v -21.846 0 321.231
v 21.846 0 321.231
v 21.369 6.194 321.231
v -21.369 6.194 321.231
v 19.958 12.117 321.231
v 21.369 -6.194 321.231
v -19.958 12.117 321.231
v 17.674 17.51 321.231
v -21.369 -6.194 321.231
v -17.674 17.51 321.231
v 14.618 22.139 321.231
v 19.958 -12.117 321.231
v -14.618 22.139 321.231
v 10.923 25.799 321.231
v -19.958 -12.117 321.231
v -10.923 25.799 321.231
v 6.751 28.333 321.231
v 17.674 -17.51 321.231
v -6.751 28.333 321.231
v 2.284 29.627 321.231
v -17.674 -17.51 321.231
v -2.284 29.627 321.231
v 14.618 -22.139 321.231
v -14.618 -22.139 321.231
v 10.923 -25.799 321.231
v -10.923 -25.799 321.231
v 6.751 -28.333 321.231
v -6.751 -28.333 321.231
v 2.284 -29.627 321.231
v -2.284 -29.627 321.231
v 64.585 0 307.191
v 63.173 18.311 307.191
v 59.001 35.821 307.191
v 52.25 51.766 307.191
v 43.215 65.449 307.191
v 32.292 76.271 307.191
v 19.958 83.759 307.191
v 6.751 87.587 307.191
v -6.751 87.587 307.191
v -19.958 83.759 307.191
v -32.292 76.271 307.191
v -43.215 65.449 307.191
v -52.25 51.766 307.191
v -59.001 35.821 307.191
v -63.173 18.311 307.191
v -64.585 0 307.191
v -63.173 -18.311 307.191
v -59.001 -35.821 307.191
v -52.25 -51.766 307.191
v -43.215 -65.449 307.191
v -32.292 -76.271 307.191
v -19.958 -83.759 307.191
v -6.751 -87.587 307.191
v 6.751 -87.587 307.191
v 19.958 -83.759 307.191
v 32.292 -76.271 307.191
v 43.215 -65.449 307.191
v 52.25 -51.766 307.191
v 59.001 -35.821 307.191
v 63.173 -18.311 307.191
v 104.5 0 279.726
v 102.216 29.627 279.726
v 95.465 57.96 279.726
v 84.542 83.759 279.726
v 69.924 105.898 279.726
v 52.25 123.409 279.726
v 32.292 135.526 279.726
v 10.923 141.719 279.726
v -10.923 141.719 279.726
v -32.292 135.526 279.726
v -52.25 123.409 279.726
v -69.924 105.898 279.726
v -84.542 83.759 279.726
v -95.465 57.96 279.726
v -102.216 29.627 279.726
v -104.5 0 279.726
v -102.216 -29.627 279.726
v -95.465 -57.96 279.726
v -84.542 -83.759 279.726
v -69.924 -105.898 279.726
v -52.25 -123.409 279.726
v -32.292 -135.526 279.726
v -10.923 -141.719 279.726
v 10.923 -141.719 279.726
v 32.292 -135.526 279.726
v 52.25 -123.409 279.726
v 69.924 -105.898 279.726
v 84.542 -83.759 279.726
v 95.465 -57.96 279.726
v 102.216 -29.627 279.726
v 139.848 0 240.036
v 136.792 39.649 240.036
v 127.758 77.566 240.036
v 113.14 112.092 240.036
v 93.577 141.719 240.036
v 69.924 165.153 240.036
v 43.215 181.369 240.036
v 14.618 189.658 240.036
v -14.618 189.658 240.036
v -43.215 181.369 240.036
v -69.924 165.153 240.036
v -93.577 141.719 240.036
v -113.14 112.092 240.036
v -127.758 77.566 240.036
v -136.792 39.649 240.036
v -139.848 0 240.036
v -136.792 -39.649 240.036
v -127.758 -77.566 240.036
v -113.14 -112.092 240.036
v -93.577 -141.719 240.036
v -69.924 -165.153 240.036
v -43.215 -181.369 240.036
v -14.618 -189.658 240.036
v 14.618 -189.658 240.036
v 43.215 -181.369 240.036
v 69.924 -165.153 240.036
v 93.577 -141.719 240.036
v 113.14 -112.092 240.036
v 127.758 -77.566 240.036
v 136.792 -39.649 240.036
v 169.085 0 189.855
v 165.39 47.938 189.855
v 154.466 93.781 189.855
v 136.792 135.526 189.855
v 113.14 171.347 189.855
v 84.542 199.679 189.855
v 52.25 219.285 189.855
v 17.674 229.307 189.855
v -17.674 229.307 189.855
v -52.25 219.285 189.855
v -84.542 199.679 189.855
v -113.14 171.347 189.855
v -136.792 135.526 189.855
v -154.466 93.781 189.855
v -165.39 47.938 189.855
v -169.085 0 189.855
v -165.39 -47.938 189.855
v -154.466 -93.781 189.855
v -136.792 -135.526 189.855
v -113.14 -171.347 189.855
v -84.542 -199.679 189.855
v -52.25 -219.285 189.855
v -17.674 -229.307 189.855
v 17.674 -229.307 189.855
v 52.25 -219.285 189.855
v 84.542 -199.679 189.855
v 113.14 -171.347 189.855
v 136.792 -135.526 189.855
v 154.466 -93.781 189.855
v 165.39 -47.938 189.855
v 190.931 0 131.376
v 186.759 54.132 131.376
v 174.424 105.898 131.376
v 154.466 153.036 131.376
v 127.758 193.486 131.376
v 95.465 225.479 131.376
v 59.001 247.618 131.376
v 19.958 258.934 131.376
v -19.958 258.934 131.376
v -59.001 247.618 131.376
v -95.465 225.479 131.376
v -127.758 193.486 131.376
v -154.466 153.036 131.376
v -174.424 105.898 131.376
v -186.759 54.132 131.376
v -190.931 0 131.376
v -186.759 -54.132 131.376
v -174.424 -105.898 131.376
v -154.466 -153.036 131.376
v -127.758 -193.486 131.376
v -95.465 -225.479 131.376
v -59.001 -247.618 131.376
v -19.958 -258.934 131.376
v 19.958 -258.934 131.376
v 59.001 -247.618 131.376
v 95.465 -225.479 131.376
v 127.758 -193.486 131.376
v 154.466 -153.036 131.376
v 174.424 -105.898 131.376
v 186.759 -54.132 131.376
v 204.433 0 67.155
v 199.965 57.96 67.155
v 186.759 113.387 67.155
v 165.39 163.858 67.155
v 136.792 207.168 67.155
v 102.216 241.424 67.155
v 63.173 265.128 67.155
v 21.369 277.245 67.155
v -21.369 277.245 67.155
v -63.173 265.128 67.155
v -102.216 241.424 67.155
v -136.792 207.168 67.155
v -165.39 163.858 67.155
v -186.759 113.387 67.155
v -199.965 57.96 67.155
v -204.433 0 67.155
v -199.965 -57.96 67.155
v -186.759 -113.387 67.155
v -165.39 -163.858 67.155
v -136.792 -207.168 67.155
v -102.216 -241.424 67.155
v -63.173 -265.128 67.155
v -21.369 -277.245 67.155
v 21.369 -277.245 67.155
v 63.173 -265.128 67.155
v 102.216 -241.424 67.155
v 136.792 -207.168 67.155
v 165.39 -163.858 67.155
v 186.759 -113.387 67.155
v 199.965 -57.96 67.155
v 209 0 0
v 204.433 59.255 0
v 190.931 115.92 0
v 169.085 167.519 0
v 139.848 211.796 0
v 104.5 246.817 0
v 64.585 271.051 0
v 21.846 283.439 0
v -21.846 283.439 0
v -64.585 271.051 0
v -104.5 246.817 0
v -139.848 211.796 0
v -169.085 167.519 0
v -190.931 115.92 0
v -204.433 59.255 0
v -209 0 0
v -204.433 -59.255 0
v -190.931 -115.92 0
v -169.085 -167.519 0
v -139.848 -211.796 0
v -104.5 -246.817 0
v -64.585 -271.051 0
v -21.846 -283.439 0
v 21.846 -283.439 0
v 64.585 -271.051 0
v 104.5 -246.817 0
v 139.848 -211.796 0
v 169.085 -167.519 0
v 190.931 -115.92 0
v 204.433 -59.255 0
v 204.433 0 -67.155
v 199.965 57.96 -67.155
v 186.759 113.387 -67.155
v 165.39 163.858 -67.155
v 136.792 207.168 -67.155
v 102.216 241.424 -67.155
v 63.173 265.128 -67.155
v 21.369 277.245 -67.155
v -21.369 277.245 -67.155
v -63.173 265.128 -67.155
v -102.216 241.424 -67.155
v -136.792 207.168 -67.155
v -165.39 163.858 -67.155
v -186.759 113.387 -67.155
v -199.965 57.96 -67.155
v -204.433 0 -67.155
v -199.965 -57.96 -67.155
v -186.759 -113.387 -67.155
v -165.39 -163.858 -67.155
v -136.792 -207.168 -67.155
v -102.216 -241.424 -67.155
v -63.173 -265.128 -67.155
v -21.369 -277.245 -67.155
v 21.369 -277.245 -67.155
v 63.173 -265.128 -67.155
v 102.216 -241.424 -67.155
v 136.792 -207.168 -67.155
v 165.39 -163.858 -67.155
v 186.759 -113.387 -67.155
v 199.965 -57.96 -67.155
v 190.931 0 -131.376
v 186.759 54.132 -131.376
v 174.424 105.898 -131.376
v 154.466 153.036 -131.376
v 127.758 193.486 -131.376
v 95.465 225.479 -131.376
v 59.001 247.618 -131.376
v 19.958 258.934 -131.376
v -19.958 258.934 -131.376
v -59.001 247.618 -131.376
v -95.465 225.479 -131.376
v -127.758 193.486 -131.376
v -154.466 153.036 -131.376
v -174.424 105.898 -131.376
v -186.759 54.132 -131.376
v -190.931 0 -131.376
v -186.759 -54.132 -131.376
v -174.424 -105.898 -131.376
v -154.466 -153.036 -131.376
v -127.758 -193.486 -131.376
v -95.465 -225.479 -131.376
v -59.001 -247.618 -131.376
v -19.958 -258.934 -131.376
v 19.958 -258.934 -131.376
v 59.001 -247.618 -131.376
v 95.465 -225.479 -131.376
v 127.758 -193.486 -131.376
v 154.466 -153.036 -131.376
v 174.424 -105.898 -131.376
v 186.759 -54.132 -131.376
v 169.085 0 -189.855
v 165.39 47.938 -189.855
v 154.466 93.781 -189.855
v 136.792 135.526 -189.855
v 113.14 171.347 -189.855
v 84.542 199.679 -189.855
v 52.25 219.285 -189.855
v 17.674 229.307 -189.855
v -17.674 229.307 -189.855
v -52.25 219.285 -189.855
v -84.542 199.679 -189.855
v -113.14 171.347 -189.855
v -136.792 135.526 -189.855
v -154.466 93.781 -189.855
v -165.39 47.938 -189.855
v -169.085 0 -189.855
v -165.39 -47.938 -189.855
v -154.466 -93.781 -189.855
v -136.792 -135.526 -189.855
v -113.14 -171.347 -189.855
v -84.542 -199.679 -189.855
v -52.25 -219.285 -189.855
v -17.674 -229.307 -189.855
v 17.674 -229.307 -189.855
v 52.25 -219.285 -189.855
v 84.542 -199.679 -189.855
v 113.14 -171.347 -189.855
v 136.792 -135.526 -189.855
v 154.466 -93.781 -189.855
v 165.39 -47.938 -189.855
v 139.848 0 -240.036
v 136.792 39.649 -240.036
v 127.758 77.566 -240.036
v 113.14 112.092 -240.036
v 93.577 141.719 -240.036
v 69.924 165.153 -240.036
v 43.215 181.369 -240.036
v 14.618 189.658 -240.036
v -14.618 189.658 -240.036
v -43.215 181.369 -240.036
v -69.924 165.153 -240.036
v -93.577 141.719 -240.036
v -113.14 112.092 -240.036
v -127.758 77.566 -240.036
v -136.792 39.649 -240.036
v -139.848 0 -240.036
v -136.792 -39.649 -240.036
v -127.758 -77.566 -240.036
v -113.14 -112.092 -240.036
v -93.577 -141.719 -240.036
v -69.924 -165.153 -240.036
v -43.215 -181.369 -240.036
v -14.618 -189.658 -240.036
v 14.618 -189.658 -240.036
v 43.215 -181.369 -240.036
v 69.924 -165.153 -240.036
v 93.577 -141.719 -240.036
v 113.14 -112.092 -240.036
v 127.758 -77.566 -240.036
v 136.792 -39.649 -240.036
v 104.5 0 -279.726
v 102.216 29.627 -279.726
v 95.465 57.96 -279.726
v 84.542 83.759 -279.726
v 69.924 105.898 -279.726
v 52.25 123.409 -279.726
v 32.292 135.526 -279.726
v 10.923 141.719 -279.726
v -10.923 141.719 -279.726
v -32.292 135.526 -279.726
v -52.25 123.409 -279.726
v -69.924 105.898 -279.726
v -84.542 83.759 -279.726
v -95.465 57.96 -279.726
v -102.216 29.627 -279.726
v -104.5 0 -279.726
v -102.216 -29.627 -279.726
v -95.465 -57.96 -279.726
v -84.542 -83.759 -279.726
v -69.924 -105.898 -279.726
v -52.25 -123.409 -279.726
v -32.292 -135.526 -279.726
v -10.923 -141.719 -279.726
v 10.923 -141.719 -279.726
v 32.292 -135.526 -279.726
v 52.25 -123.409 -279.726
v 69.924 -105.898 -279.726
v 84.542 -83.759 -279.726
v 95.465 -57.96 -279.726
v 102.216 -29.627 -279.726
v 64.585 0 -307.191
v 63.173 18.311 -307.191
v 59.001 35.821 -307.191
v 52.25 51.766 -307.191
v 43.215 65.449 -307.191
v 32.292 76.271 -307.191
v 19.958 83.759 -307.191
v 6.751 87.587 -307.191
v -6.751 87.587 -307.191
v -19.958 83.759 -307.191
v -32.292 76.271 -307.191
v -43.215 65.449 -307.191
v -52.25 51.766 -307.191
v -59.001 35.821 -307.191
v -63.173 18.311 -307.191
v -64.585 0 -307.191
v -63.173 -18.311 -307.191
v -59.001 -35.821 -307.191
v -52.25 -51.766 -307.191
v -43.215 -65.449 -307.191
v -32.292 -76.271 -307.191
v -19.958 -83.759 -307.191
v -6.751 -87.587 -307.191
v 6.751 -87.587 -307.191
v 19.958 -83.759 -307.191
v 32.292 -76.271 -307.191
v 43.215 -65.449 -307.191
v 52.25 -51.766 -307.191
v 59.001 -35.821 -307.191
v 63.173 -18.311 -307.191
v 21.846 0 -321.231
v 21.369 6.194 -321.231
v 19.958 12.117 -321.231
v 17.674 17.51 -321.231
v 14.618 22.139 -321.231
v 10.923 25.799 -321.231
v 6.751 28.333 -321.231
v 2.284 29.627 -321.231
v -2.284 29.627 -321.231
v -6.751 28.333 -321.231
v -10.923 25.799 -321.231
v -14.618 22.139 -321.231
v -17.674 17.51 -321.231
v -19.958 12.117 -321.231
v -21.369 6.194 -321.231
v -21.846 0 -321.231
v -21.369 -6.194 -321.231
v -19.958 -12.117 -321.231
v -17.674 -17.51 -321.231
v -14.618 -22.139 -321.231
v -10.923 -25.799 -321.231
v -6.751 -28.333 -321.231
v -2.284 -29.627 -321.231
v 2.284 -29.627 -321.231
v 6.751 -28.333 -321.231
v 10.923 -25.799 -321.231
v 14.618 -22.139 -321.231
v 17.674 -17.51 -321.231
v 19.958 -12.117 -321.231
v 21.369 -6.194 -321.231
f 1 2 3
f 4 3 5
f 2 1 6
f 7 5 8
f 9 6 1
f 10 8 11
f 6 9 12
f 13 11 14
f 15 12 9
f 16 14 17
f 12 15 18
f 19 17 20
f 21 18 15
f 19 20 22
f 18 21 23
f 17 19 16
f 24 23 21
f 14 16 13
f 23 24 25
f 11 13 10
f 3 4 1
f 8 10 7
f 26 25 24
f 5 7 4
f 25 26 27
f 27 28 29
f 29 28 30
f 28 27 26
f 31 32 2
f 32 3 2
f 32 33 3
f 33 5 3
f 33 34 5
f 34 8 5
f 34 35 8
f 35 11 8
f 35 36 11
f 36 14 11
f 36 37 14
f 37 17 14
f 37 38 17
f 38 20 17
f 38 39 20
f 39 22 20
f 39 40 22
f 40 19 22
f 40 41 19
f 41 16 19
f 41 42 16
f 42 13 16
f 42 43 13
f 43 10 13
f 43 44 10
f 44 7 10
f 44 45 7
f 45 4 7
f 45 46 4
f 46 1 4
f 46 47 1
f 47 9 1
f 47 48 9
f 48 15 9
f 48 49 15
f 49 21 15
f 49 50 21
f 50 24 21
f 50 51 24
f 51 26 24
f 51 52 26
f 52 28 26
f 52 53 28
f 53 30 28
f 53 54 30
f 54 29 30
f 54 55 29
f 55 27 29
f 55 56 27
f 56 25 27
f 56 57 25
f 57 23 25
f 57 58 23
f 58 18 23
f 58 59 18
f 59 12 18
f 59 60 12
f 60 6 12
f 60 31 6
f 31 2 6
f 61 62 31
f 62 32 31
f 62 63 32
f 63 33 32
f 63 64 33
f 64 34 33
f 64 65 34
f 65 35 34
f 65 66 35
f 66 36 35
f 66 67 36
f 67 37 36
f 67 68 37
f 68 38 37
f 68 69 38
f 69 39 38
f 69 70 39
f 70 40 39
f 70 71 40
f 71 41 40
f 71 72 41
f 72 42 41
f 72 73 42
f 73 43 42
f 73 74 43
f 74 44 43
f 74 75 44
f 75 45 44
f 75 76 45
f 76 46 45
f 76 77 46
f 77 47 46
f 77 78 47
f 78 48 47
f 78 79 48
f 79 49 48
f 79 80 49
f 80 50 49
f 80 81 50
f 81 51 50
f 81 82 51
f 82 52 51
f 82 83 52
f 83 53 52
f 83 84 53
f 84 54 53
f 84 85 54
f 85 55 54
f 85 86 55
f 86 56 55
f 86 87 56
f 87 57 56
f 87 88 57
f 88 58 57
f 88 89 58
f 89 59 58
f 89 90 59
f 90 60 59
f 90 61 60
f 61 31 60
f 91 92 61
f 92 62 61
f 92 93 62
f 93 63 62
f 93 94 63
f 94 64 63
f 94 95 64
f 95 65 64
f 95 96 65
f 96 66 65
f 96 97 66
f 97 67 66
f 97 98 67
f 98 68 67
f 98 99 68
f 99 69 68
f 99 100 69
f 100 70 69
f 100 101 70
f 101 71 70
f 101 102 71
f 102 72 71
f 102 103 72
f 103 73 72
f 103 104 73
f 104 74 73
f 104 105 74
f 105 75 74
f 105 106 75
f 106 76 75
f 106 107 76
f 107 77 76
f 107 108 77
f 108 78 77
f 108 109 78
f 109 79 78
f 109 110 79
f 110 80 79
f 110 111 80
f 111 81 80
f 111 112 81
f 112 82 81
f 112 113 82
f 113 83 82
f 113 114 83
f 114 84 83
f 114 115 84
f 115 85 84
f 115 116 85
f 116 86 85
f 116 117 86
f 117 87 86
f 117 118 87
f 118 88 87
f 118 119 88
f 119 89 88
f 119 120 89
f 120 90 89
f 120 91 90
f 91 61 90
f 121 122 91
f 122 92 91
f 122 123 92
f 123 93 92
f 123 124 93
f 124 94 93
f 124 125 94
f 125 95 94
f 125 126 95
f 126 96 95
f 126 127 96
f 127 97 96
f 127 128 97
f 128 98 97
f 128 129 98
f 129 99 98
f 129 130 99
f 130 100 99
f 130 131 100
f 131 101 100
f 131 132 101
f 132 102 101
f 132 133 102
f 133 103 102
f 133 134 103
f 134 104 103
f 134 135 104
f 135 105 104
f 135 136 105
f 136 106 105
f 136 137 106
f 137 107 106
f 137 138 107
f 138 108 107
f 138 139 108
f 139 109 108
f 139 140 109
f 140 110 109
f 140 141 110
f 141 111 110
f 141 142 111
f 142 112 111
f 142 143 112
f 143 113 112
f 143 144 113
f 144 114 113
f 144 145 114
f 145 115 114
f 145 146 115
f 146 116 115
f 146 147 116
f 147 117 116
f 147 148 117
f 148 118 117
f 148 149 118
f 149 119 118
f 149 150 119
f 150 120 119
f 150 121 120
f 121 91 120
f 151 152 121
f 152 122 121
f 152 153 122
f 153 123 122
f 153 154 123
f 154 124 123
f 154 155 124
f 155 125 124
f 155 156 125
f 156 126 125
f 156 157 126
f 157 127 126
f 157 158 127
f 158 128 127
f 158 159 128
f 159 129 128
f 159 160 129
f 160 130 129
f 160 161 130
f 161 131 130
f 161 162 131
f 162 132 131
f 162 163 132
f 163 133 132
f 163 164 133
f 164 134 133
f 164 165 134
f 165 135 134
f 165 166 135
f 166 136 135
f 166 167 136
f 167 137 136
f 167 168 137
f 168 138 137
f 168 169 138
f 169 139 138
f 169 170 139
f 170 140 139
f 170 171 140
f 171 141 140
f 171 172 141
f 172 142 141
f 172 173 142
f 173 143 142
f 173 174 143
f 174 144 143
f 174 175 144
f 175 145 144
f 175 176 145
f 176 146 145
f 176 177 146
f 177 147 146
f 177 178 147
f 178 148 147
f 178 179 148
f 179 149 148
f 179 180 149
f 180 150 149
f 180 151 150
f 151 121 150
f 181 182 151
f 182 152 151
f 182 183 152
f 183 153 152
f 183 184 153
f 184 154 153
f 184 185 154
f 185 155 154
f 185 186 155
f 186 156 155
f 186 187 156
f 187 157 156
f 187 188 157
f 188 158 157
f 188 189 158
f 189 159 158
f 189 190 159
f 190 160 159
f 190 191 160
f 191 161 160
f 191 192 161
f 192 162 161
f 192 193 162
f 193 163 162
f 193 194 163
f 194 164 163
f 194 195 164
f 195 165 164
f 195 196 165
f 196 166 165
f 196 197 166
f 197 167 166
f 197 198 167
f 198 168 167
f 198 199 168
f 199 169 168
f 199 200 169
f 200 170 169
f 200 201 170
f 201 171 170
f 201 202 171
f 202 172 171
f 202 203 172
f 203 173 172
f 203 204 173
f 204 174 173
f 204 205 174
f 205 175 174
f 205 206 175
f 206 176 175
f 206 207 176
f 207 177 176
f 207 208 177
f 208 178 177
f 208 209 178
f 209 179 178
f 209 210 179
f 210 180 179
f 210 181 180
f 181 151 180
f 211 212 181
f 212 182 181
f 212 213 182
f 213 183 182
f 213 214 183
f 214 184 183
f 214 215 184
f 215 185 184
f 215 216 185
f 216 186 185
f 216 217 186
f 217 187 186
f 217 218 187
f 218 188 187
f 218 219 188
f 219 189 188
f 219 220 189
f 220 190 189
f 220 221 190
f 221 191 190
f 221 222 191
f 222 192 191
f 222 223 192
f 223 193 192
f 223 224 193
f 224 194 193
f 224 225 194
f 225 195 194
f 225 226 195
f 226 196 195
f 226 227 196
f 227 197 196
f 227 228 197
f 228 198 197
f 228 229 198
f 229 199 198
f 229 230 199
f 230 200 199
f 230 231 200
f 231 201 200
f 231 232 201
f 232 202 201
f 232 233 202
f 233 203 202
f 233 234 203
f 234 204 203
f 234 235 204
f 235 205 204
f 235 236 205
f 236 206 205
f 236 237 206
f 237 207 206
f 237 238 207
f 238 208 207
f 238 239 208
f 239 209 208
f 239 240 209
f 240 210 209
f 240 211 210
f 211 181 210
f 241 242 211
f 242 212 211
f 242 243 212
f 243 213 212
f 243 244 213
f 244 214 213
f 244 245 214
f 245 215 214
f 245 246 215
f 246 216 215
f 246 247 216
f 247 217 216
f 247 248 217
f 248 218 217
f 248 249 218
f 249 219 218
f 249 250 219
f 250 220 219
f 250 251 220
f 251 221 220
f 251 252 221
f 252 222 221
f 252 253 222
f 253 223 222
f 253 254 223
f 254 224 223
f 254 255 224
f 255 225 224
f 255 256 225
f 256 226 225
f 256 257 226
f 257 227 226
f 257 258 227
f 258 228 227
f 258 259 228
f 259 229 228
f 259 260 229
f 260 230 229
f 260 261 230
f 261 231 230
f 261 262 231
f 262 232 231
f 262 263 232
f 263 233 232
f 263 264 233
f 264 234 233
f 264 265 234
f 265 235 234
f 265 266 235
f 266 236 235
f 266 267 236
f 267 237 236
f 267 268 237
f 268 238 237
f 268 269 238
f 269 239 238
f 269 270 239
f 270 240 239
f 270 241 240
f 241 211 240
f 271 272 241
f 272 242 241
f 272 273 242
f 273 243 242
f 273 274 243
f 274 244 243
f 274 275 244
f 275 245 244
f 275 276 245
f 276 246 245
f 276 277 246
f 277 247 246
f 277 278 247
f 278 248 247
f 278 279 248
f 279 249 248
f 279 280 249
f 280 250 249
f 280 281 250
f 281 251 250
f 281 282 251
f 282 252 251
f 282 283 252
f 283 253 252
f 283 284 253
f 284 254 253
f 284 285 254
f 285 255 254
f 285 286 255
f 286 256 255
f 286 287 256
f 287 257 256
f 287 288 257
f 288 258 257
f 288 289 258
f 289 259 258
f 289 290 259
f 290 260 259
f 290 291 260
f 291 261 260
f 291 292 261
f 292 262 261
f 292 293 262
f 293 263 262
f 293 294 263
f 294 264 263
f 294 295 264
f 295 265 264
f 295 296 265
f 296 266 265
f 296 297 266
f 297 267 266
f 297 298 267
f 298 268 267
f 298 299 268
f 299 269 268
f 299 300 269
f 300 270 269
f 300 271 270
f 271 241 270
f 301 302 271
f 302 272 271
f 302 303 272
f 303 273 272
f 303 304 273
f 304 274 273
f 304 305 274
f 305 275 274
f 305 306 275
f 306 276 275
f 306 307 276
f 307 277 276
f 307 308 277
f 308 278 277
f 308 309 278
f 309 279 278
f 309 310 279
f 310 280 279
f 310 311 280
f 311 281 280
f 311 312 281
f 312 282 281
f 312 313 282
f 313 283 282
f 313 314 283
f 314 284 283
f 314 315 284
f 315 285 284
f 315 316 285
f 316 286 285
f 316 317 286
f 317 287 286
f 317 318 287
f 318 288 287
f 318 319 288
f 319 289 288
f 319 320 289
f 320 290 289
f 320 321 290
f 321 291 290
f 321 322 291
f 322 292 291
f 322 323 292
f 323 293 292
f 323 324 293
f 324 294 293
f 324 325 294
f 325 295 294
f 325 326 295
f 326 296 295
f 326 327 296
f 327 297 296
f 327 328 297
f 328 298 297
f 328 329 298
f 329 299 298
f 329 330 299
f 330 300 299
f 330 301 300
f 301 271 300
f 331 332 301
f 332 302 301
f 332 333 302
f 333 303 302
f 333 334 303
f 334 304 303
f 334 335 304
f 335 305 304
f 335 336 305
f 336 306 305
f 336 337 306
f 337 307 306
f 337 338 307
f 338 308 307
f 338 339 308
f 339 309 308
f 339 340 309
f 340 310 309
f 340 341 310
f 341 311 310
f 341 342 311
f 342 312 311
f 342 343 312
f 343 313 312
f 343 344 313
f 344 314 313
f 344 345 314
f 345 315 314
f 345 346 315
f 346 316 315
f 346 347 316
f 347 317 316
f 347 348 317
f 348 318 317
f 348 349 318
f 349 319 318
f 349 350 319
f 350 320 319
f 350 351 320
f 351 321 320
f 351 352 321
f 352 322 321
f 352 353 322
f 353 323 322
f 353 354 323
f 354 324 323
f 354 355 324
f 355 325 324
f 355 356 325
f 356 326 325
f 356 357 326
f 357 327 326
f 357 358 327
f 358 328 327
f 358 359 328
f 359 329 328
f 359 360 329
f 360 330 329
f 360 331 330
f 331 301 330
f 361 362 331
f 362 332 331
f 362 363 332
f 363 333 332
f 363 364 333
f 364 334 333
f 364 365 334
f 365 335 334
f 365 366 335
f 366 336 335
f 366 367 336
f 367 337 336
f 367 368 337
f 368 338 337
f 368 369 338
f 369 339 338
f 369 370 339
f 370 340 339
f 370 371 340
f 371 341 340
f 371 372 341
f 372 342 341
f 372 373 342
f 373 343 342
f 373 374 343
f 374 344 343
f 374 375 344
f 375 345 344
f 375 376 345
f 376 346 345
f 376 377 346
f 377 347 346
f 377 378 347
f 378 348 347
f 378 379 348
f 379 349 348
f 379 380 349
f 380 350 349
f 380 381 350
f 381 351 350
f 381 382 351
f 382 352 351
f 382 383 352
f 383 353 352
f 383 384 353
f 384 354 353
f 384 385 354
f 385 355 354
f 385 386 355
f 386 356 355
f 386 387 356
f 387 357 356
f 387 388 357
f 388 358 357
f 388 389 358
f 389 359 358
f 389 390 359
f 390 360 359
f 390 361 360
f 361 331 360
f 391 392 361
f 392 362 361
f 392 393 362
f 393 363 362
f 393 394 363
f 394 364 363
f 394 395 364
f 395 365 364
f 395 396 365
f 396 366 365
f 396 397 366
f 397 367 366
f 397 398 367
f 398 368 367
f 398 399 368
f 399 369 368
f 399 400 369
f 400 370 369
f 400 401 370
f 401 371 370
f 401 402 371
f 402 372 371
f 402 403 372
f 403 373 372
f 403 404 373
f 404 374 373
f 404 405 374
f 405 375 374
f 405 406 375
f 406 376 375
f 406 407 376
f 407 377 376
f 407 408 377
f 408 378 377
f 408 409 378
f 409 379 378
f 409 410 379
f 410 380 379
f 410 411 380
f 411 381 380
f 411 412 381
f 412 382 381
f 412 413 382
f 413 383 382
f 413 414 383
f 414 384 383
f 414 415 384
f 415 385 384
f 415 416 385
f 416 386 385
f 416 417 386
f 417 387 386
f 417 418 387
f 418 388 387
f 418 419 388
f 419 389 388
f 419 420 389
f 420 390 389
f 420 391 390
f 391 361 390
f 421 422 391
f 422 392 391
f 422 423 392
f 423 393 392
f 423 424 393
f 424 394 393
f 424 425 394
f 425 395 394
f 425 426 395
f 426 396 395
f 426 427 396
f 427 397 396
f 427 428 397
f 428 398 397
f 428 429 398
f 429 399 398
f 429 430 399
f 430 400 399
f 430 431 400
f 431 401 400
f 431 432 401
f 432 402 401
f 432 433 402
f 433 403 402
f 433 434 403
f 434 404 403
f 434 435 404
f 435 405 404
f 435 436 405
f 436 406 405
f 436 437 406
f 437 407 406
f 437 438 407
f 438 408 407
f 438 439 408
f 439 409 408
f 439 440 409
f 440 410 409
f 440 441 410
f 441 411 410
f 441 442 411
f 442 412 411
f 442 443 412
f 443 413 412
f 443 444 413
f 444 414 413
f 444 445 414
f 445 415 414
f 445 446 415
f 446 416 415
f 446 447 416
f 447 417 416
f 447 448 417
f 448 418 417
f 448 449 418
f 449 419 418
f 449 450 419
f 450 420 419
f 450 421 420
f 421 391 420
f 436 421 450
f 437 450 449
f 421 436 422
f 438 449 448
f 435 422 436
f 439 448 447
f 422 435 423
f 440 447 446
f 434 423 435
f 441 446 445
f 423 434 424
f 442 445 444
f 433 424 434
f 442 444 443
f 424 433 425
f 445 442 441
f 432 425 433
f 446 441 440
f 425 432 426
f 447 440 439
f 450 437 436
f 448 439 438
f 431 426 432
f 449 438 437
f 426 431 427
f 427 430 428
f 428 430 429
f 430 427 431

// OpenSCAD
// Generated by SolidPython 1.0.1 on 2020-07-29 00:39:26


scale(v = [11, 15, 17]) {
	sphere(r = 19);
}
/***********************************************
*********      SolidPython code:      **********
************************************************
 
# import packages: SolidPython
from solid import *
from solid.utils import *
from itertools import chain, combinations


class Resize:

    def __init__(self, scad_file):
        self.scad_file = scad_file
        #self.scad_file = import_scad(scad_file)
        # cone/cylinder param:
        self.r1 = 0
        self.r2 = 0
        self.h = 0
        # rectangular prism param:
        self.w = 0
        self.l = 0
        # ellipse param:
        self.r = 0

    # import OpenScad code (file name corresponds to shape)


    # classify shape + parameters
    def assign(self, param1, param2, param3):
        if self.scad_file == 'cone.scad':
            self.r1 = param1
            self.r2 = param2
            self.h = param3
        elif self.scad_file == 'cylinder.scad':
            self.r1 = param1
            self.r2 = param2
            self.h = param3
        elif self.scad_file == 'rectangularPrism.scad':
            self.h = param1
            self.l = param2
            self.w = param3
        else:
            self.r = param1
            self.h = param2

    # resize parameters
    def iterate(self):
        x = range(3, 20, 2)
        i = 1
        if self.scad_file == 'cone.scad':
            tempList = list(combinations(x, 2))
            for temp in tempList:
                param1 = temp[0]
                param2 = temp[1]
                filepath = 'produced_scad_files/' + 'cone' + str(param1) + '_' + str(param2) + '_' + '.scad'
                scad_render_to_file(cylinder(h=param1, r1=param2, r2=0), filepath)

        elif self.scad_file == 'cylinder.scad':
            tempList = list(combinations(x, 3))
            for temp in tempList:
                param1 = temp[0]
                param2 = temp[1]
                filepath = 'produced_scad_files/' + 'cylinder' + str(param1) + '_' + str(param2) + '_' + '.scad'
                scad_render_to_file(cylinder(h=param1, r1=param2, r2=param2), filepath)

        elif self.scad_file == 'rectangularPrism.scad':
            tempList = list(combinations(x, 3))
            for temp in tempList:
                param1 = temp[0]
                param2 = temp[1]
                param3 = temp[2]
                filepath = 'produced_scad_files/' + 'rectangularPrism' + str(param1) + '_' + str(param2) + '_' + str(
                    param3) + '.scad'
                scad_render_to_file(cube(size=(param1, param2, param3)), filepath)

        elif self.scad_file == 'ellipse.scad':
            tempList = list(combinations(x, 4))
            for temp in tempList:
                param1 = temp[0]
                param2 = temp[1]
                param3 = temp[2]
                param4 = temp[3]
                filepath = 'produced_scad_files/' + 'ellipse' + str(param1) + '_' + str(param2) + '_' + str(param3) + '_' + str(param4) + '.scad'
                scad_render_to_file(scale([param1, param2, param3])(sphere(r=param4)), filepath)

    def render_to_scadfile(self):
        scad_render_to_file(scad, 'example.scad') 
 
************************************************/
